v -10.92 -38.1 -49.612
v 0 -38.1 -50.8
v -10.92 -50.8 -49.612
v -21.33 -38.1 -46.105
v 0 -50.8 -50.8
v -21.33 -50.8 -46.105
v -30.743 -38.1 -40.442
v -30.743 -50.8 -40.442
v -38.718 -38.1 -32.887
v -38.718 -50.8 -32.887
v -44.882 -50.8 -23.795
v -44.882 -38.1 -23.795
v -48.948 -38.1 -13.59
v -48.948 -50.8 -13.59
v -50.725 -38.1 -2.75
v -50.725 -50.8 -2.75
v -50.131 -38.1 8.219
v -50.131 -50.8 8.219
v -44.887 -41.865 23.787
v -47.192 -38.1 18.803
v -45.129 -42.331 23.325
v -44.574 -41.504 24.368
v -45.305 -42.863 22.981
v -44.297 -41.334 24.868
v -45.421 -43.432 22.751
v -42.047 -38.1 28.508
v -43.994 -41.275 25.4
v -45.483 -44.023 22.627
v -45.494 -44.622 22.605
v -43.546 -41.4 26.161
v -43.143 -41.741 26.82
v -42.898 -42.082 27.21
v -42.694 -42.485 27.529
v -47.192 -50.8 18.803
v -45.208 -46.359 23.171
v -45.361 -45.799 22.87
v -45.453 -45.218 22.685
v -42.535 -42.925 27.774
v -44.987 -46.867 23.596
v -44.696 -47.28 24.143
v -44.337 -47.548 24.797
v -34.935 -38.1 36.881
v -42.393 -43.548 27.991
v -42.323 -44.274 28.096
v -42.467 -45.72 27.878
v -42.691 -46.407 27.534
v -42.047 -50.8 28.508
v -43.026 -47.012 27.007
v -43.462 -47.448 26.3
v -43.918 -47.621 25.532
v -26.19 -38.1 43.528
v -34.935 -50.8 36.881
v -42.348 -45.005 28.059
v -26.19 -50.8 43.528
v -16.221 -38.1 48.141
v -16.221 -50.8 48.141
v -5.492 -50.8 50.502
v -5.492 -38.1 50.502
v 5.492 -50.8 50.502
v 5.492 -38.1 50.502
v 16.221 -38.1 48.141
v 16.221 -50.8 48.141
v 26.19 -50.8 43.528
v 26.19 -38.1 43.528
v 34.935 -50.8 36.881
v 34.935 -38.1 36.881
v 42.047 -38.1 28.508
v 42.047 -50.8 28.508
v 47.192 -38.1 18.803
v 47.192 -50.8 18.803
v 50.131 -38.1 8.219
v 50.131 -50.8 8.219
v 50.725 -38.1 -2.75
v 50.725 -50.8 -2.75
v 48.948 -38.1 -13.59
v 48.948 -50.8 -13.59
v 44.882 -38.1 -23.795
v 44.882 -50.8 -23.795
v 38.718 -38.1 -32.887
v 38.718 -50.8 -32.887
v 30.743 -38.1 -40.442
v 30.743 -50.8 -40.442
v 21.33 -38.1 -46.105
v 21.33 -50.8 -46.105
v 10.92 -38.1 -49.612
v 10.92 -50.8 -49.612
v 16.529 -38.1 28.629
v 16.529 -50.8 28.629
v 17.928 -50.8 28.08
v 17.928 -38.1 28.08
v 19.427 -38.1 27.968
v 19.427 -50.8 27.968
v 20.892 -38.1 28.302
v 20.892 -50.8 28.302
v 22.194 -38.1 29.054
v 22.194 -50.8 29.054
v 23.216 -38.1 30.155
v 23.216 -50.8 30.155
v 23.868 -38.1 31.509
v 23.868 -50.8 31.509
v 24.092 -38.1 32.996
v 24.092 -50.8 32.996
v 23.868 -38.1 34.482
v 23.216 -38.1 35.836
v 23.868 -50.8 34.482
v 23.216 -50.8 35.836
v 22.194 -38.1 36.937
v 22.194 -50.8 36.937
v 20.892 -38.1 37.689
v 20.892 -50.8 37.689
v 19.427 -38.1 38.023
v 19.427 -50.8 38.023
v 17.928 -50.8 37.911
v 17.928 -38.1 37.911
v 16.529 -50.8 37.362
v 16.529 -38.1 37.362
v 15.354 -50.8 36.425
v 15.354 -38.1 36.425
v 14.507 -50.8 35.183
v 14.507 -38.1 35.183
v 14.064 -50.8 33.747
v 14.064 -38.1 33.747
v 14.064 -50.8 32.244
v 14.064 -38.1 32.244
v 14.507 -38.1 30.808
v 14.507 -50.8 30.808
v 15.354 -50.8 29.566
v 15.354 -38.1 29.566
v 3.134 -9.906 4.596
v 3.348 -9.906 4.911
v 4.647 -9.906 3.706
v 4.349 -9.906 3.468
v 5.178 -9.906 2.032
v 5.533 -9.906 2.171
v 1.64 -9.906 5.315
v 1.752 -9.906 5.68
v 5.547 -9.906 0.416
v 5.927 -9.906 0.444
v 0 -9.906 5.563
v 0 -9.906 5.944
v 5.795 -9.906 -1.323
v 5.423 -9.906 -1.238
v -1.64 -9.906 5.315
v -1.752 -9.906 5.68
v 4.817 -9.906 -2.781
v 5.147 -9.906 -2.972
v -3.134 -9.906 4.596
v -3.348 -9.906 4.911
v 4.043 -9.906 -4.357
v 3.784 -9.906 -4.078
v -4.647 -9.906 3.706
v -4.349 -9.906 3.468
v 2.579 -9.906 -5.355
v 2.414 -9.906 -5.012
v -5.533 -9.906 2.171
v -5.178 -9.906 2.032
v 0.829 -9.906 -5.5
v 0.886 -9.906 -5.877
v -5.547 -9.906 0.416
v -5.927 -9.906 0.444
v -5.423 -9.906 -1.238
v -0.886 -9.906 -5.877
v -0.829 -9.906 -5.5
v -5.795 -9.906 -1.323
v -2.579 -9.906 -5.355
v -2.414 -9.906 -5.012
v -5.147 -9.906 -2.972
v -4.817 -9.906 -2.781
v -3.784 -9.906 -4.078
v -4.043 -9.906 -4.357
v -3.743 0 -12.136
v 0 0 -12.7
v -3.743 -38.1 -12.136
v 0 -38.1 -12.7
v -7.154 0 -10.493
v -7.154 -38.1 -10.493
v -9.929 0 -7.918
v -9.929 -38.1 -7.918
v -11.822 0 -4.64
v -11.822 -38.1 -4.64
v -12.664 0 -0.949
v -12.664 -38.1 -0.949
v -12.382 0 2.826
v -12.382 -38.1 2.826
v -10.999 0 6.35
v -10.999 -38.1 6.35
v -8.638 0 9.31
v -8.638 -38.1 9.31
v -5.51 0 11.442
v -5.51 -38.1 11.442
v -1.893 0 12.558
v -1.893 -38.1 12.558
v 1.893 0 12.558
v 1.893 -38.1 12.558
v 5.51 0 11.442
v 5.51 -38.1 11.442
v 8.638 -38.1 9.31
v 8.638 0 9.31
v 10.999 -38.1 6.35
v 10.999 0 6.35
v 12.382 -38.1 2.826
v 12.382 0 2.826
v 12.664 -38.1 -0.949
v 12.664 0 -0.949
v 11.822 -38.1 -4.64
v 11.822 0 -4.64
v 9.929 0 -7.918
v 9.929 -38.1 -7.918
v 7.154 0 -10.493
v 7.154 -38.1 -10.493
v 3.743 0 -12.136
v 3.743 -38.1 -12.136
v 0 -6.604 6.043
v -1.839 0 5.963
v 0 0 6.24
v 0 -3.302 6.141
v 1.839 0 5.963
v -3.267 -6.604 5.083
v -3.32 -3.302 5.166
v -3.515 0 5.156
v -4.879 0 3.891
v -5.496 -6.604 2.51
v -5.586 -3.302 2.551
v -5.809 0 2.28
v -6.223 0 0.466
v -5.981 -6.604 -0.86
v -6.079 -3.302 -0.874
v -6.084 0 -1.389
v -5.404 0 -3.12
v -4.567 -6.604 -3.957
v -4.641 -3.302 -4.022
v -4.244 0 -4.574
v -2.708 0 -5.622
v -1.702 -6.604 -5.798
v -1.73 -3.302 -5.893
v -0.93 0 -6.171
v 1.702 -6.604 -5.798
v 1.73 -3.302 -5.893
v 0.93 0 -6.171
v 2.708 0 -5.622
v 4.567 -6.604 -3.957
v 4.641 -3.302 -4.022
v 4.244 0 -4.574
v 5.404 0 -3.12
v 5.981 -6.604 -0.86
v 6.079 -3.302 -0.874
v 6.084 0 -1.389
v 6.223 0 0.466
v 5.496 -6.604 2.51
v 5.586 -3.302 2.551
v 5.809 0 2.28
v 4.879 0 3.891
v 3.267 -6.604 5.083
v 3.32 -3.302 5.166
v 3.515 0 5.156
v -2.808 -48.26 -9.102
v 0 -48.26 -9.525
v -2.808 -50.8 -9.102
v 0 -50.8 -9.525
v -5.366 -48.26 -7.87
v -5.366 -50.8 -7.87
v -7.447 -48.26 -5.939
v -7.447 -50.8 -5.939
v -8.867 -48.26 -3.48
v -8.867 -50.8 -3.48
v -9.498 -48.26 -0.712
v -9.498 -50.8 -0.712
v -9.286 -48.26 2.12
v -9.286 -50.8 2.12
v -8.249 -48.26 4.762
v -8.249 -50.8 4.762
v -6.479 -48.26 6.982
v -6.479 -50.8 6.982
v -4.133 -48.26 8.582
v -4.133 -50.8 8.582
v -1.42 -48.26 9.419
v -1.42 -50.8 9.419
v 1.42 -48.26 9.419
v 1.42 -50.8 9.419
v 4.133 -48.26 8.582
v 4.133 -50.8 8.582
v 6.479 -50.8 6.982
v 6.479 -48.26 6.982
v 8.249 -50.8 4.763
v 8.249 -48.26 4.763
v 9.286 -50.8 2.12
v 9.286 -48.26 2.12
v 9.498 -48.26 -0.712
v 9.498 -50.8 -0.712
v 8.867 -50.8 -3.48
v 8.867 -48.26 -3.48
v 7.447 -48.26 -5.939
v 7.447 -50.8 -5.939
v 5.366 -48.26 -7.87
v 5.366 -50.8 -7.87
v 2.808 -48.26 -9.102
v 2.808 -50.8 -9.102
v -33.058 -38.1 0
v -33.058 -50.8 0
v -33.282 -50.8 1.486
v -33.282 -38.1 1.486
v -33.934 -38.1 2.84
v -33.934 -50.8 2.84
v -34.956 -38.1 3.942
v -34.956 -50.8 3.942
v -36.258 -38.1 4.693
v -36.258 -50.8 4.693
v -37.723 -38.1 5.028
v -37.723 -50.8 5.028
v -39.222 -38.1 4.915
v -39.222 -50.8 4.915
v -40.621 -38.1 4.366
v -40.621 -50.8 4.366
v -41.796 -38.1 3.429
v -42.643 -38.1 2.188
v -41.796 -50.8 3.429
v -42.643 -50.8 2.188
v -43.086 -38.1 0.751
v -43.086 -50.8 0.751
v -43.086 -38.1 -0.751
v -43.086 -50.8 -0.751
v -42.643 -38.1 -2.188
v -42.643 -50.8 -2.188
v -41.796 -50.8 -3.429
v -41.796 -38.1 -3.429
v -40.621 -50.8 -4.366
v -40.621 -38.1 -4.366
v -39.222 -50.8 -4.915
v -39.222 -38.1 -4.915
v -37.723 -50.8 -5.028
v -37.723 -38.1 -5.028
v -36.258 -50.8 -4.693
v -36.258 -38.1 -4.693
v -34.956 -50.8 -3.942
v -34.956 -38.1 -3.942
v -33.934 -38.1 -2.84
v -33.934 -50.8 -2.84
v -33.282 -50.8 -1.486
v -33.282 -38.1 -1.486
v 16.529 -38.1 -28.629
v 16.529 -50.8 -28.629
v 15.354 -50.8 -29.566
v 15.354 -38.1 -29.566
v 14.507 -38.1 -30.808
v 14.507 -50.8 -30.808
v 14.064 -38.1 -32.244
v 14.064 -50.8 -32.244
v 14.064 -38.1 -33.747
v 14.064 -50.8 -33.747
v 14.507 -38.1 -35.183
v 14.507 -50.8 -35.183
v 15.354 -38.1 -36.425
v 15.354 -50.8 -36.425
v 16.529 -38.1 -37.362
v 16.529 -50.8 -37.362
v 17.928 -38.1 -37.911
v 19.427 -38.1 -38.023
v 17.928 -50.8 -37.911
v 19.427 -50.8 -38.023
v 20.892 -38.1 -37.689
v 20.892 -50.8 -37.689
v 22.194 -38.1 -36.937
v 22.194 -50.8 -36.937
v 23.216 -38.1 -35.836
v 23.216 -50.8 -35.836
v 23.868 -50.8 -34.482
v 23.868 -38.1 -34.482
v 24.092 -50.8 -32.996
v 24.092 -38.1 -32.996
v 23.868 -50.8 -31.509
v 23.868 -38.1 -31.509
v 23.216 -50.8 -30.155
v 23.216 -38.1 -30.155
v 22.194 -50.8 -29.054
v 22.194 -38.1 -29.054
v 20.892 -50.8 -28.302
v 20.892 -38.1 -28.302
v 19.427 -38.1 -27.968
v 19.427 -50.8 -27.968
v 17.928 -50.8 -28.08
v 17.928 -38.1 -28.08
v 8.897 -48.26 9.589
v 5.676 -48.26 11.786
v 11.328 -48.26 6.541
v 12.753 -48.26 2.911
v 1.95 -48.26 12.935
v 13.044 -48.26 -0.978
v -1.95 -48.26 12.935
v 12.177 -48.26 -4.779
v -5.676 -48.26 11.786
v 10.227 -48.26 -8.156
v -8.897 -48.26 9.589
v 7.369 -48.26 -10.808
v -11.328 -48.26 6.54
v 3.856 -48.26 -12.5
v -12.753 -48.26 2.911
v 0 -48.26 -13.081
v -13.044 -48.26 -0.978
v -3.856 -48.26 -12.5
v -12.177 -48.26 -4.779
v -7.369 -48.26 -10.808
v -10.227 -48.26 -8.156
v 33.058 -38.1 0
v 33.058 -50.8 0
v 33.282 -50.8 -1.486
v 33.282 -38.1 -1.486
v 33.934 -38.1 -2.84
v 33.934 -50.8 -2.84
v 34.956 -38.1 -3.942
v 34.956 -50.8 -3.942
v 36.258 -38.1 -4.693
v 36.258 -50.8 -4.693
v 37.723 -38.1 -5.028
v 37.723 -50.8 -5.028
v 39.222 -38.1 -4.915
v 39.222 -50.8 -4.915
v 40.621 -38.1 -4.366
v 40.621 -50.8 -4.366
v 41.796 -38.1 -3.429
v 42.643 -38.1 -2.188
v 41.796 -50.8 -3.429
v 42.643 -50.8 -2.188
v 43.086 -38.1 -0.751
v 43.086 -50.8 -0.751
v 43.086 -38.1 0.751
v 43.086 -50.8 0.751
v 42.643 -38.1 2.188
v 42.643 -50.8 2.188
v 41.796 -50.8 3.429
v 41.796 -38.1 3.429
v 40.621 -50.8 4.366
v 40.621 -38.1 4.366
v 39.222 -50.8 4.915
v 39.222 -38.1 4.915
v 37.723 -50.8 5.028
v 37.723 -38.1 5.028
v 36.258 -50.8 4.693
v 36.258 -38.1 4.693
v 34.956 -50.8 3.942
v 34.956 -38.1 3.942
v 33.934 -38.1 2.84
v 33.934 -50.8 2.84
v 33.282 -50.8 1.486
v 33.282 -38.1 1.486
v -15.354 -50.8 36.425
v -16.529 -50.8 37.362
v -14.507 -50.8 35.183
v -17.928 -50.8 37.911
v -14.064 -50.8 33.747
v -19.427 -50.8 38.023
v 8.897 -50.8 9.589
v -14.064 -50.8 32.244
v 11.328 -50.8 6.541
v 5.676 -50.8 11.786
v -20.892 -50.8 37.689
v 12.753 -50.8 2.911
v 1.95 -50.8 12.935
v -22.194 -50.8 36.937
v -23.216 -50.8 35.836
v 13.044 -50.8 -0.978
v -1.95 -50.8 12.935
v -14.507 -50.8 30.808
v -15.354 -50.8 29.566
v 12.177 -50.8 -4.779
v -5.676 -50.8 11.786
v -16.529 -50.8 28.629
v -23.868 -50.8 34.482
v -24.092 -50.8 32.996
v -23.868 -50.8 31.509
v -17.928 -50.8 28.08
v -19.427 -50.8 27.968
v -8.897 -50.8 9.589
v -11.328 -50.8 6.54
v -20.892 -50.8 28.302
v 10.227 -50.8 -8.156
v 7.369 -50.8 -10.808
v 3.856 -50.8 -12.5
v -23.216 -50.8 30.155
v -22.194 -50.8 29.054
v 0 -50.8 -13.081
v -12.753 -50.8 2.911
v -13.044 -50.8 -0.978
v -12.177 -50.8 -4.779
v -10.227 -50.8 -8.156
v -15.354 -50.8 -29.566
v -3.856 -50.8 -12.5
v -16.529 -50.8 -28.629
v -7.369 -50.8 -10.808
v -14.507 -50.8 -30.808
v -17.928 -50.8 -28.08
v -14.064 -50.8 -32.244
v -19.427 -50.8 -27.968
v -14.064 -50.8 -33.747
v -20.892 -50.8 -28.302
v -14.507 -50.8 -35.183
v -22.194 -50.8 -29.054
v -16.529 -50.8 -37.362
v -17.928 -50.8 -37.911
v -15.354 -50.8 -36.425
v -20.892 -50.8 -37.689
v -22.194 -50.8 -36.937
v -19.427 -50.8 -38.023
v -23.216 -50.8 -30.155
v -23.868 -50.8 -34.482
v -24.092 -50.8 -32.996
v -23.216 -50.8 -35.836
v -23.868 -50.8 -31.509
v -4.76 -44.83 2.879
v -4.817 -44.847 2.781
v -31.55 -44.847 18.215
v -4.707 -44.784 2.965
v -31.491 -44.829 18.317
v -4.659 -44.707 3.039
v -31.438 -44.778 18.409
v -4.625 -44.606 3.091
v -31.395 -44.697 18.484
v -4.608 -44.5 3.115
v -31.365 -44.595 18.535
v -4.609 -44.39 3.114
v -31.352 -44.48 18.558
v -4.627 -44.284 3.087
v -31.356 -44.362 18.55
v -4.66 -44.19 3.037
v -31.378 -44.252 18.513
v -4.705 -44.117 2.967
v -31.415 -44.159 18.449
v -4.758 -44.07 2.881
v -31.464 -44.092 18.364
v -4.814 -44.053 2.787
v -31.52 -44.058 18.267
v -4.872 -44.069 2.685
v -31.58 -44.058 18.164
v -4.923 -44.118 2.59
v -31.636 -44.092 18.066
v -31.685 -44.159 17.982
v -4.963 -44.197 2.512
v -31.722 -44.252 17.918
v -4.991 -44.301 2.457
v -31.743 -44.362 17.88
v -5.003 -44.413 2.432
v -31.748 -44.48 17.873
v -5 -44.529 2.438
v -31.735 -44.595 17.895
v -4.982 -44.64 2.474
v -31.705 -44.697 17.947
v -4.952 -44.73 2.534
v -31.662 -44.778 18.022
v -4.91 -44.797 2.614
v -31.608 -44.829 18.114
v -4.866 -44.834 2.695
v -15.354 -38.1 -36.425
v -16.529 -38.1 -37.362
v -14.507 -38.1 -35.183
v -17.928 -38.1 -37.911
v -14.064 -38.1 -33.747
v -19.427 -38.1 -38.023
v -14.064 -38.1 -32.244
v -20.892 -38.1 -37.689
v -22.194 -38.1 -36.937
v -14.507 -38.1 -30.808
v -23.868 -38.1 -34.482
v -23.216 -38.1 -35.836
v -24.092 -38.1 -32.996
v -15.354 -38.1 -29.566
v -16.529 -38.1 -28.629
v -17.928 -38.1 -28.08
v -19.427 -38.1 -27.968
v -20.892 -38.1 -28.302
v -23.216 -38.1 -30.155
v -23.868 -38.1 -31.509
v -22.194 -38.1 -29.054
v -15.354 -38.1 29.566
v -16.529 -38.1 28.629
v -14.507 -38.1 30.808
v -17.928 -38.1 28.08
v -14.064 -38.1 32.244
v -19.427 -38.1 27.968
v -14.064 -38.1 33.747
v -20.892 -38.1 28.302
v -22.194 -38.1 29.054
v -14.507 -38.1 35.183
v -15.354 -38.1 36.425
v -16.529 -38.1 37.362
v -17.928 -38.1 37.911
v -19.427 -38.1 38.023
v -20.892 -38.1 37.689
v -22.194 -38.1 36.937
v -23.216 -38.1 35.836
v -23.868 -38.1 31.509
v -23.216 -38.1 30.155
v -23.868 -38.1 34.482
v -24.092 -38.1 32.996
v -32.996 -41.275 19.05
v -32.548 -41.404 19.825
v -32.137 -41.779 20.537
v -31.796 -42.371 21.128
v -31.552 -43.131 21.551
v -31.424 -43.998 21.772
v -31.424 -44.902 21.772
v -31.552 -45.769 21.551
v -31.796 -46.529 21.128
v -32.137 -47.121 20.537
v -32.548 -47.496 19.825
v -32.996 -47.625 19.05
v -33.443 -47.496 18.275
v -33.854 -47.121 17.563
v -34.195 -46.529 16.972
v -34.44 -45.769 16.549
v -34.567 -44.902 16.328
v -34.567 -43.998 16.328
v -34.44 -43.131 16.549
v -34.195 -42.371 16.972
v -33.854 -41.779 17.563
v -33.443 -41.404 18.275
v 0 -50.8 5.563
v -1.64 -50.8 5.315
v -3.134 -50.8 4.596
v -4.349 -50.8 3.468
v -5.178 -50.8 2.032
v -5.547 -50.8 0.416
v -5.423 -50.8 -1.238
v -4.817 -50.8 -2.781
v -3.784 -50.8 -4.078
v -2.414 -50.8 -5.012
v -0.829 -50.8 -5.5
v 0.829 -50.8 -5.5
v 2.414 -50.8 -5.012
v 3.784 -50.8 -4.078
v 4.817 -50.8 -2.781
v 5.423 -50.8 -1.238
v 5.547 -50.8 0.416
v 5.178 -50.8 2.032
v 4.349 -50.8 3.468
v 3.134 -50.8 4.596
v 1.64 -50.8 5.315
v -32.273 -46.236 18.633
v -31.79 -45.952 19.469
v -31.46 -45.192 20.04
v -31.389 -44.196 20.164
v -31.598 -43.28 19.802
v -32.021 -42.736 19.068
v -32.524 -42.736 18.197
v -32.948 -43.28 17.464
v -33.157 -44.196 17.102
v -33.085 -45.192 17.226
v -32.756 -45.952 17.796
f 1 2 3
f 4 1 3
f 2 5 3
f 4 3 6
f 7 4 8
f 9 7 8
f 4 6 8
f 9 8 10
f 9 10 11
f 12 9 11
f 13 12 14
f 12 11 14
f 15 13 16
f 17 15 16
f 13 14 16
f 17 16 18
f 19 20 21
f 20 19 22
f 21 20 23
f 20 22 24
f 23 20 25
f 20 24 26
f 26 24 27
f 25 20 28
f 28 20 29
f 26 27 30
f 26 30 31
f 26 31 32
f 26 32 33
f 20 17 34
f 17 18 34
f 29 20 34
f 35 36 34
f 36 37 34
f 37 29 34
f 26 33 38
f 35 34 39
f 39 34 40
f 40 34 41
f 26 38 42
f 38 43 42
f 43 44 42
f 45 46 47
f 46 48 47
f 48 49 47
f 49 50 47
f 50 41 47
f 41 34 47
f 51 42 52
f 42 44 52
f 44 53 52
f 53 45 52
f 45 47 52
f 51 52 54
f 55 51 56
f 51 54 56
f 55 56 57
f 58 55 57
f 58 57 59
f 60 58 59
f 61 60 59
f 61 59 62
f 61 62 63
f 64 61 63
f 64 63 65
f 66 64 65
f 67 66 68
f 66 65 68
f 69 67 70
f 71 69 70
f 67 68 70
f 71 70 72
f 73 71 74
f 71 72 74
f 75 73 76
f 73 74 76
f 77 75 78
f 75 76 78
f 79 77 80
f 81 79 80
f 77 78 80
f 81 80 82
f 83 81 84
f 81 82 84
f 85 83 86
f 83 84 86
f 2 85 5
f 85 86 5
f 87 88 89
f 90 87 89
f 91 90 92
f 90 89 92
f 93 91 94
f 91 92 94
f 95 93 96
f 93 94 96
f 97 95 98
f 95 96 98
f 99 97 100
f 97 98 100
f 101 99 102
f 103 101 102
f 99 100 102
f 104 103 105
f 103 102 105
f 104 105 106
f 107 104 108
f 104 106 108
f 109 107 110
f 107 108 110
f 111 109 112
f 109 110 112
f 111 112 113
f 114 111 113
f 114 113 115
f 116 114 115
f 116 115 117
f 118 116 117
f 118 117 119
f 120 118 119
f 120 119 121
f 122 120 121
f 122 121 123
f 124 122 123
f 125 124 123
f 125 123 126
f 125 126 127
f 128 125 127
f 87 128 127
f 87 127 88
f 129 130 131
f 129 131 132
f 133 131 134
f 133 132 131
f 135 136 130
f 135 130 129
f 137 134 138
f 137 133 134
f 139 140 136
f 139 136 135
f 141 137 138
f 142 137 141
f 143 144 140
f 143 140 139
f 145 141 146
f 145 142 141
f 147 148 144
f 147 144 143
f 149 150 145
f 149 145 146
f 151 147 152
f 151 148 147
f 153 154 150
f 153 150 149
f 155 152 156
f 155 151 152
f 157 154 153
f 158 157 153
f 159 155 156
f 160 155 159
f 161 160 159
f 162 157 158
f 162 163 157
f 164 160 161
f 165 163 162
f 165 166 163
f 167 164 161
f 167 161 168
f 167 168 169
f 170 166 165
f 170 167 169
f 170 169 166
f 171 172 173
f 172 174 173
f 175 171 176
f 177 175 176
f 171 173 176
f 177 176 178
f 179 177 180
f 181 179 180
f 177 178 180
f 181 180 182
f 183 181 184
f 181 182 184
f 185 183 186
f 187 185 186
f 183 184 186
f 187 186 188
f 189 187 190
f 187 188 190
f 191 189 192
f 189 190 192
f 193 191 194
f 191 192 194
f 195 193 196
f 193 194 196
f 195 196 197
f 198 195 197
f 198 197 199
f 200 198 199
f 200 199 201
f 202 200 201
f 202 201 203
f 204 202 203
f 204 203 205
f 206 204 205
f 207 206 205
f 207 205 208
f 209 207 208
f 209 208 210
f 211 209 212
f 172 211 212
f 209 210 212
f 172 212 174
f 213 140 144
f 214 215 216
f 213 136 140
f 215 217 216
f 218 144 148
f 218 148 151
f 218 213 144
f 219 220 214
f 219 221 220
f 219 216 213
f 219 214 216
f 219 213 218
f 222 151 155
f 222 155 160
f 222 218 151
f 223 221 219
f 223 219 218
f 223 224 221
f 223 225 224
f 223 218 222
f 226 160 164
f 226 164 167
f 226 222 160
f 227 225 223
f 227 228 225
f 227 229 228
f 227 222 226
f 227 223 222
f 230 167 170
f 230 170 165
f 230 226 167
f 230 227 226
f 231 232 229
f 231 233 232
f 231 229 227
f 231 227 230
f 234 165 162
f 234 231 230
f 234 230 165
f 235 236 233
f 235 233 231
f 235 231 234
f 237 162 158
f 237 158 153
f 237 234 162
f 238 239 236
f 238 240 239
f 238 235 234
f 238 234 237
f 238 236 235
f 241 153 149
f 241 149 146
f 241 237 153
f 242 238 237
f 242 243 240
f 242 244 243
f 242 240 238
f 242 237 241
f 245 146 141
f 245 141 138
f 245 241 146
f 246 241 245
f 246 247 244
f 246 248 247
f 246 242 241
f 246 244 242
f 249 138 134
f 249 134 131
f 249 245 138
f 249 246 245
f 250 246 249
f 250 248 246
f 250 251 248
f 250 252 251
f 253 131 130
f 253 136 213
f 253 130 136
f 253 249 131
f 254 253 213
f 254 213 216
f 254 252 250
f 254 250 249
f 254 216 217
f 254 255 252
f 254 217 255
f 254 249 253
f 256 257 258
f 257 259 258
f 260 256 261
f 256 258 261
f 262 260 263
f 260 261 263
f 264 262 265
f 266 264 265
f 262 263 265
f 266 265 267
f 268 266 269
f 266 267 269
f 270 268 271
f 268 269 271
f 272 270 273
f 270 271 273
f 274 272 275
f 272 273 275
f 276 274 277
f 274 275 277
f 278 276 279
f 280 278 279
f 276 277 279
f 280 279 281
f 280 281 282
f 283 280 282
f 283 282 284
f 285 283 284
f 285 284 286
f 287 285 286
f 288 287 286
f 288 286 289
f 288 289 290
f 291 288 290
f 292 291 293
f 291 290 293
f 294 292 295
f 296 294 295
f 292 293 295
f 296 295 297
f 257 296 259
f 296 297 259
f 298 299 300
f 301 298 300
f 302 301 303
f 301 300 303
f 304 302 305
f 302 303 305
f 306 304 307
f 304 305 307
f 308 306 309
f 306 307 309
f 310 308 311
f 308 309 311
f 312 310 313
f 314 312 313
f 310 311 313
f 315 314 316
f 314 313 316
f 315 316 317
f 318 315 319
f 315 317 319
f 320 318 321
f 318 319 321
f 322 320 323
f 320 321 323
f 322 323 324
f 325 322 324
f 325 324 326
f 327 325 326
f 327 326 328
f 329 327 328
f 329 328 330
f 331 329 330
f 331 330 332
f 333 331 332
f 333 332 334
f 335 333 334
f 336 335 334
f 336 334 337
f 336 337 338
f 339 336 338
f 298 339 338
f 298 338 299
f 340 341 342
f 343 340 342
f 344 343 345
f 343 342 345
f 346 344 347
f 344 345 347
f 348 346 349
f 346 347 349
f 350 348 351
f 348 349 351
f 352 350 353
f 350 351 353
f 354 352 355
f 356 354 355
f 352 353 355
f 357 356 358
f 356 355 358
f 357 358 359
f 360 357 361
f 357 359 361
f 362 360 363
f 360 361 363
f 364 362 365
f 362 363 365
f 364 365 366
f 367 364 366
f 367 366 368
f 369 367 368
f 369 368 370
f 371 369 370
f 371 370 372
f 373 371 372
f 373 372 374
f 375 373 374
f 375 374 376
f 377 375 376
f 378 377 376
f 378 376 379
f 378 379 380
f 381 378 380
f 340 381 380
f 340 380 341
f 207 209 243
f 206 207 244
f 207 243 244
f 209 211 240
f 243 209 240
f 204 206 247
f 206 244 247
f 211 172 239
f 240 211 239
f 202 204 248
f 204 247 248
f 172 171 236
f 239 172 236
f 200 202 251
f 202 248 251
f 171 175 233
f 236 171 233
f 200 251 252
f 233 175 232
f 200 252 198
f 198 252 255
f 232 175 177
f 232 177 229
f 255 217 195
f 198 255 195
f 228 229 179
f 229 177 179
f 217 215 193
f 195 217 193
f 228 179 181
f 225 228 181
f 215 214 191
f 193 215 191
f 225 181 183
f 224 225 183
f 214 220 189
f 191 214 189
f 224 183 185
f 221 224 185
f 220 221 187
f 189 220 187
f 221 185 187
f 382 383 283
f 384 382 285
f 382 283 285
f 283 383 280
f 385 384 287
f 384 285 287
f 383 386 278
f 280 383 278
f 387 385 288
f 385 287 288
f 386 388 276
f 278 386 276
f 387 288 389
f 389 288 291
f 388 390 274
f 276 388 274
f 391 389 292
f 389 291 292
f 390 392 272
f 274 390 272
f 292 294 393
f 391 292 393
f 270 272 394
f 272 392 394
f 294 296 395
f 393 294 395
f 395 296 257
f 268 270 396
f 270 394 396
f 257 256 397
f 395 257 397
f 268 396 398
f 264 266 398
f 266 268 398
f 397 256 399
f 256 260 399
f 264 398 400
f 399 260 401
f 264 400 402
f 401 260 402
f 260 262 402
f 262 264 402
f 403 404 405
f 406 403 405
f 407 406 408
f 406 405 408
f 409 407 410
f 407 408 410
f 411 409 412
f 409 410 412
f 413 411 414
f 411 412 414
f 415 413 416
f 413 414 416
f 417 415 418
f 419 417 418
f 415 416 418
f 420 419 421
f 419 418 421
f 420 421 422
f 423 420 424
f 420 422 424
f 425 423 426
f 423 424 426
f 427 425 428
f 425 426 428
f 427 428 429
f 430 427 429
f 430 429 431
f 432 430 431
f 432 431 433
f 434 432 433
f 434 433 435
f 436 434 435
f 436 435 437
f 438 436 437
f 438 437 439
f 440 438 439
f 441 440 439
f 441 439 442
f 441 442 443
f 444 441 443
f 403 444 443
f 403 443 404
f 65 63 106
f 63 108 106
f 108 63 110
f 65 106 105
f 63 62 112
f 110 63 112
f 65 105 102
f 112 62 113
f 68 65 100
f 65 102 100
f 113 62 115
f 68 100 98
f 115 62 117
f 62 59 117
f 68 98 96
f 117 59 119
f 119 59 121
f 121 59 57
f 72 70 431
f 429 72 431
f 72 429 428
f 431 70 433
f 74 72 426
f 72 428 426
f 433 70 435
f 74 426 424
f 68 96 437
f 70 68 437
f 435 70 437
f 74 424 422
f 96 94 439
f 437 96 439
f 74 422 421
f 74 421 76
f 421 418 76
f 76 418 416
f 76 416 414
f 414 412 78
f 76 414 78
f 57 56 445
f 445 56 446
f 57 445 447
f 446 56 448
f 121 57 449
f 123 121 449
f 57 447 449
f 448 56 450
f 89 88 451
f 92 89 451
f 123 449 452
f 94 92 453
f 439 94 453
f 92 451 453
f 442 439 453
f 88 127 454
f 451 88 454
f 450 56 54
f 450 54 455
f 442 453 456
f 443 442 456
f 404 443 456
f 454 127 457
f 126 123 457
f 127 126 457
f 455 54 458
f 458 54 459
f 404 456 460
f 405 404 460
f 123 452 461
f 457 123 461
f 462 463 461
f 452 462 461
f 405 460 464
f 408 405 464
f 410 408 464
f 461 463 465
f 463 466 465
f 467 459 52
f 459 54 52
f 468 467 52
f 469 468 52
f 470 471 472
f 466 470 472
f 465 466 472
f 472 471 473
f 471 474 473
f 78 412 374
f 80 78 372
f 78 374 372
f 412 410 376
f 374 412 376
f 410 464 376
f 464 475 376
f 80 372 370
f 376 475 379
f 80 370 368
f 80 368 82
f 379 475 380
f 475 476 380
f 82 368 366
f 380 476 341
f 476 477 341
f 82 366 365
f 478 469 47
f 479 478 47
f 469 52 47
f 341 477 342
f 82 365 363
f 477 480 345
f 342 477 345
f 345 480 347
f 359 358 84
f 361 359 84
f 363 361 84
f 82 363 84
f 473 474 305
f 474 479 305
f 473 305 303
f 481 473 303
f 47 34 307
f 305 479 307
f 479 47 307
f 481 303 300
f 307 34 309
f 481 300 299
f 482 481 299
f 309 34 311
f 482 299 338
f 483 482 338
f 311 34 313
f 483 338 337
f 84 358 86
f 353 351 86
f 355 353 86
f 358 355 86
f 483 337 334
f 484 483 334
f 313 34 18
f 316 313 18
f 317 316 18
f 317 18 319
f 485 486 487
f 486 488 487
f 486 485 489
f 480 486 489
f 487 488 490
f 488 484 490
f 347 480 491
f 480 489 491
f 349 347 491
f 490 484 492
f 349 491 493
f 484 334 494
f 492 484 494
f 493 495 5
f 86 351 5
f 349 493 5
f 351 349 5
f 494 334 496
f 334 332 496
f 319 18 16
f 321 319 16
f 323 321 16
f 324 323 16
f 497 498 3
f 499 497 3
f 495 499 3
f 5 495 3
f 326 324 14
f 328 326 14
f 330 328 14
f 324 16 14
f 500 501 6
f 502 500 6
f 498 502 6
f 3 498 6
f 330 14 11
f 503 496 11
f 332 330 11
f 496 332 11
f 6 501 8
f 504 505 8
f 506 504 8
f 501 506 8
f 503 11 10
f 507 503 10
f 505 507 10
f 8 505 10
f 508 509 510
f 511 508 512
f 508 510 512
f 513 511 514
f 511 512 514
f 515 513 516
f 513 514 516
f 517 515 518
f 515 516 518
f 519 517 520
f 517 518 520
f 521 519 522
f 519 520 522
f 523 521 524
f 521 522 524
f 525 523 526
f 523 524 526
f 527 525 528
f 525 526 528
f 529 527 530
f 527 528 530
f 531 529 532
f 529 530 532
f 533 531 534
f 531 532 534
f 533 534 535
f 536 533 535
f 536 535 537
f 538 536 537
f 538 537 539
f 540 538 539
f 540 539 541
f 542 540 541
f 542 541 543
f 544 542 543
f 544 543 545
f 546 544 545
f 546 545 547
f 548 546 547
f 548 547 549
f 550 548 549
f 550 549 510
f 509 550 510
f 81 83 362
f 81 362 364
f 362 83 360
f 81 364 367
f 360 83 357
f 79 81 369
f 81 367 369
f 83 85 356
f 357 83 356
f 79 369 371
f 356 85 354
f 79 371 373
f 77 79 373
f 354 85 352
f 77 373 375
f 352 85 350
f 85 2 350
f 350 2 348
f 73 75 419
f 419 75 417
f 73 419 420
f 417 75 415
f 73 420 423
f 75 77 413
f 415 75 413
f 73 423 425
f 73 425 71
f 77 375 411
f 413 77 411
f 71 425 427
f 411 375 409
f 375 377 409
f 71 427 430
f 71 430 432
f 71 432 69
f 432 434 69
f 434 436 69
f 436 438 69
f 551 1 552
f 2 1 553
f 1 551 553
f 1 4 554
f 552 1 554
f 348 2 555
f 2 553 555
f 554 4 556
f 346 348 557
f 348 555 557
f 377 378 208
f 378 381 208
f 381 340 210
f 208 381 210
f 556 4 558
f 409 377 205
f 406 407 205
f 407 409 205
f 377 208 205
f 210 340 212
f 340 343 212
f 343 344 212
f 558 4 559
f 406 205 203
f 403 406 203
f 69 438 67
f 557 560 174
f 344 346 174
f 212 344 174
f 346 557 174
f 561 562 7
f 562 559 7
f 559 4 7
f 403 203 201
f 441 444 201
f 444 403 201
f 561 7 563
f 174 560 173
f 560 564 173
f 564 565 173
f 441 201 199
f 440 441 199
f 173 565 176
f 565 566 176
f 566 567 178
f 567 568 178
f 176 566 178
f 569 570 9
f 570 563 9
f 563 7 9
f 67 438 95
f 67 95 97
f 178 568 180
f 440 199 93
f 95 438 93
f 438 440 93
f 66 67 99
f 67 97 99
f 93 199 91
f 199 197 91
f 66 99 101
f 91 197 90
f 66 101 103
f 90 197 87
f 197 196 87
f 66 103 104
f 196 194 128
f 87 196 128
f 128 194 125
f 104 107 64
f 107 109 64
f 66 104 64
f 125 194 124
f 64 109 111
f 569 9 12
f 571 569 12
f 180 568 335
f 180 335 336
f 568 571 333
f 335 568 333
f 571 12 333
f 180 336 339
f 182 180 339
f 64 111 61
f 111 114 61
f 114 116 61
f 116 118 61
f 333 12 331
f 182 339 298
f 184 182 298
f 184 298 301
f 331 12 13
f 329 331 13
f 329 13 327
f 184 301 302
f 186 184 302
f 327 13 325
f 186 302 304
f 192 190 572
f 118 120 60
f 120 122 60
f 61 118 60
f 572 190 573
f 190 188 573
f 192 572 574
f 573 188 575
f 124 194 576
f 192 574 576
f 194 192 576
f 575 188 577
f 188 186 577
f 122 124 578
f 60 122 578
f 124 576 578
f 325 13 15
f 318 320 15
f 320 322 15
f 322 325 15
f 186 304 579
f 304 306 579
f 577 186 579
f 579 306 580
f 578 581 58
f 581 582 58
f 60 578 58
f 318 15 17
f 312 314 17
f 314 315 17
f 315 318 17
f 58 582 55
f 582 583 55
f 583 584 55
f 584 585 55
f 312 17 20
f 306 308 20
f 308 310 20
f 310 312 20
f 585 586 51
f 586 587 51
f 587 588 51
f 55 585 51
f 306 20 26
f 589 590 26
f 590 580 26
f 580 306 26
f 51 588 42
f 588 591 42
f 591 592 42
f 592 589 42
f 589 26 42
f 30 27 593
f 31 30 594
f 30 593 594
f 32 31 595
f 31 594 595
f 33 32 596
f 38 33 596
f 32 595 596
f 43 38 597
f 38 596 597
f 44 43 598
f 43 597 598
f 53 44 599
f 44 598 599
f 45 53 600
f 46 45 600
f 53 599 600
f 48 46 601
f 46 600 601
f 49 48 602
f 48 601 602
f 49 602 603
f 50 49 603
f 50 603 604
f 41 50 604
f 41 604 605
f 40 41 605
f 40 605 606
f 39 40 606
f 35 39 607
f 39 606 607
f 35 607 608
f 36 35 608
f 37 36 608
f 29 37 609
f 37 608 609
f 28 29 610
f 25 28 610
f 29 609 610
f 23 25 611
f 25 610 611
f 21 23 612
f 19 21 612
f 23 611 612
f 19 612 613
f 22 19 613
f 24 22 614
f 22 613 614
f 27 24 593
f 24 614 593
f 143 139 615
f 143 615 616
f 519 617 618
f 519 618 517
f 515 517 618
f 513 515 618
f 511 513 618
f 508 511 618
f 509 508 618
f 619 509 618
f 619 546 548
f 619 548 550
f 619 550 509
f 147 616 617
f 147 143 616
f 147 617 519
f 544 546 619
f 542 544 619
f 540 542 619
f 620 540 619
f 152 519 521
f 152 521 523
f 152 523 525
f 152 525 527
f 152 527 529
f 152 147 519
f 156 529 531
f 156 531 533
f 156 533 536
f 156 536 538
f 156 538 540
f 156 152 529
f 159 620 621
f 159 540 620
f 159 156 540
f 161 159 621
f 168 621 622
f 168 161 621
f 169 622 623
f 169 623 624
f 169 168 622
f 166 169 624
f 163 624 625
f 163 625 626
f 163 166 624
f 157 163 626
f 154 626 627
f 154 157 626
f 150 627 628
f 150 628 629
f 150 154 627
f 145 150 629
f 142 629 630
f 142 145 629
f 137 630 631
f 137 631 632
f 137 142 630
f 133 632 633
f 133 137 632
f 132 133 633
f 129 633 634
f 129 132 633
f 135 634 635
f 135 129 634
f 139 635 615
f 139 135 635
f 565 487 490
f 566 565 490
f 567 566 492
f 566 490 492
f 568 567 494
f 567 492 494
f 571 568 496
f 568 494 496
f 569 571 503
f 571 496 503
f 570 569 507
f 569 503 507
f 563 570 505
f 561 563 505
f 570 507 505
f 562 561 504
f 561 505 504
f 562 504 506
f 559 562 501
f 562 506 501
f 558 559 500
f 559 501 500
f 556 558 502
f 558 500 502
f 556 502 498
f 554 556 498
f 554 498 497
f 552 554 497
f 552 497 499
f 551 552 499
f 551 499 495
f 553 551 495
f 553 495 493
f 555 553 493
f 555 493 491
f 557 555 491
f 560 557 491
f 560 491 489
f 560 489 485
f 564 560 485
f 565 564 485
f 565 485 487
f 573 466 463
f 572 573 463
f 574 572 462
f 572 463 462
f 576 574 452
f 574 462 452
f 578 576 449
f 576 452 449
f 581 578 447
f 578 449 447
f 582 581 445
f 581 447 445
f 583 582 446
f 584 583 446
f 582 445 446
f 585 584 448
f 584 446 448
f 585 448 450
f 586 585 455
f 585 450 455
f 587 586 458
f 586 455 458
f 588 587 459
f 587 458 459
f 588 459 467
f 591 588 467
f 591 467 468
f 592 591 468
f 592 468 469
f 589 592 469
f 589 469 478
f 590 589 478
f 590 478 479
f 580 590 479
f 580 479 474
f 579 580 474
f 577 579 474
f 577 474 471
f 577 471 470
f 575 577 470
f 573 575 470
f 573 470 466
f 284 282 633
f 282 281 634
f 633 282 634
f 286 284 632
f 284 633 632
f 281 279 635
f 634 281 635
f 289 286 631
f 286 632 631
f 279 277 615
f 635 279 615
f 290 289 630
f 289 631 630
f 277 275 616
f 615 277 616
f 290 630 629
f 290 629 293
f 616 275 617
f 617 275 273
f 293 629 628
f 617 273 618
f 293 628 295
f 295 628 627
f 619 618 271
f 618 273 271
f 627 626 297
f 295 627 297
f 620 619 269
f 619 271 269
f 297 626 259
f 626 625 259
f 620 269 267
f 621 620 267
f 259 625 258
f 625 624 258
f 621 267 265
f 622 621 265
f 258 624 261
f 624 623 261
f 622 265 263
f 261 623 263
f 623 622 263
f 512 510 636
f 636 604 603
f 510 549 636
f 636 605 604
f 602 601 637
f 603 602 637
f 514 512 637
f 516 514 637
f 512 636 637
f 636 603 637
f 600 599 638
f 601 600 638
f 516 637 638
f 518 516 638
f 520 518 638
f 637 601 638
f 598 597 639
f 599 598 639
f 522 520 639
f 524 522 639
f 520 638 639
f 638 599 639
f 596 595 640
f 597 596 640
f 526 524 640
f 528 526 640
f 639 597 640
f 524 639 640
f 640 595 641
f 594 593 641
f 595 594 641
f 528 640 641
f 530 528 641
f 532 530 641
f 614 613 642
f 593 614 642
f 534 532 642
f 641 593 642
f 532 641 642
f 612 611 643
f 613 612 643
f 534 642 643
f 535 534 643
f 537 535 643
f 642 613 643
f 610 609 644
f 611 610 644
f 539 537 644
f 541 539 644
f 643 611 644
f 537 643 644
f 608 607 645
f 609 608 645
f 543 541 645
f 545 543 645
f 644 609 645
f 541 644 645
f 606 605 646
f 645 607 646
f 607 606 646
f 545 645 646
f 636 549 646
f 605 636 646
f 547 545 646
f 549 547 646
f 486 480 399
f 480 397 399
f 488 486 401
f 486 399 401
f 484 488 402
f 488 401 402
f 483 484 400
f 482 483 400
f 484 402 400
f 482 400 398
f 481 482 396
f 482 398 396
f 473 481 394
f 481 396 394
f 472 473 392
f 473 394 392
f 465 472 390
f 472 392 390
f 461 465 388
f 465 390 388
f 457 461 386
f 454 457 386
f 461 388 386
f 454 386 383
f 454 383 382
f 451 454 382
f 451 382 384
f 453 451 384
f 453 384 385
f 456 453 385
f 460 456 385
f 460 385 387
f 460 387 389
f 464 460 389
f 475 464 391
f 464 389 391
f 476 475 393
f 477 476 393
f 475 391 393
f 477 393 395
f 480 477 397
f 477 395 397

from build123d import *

# Parameters (mm, degrees)
F_3_8_CLEARANCE_HOLE1_D              = 10.0838
CIRPATTERN1_COUNT                    = 6
F_1_32_0_03125_DIAMETER_HOLE1_REACH  = 133.807
F_1_32_0_03125_DIAMETER_HOLE1_BORE_R = 0.396875
F_1_4_0_25_DIAMETER_HOLE1_D          = 6.35
F_1_4_0_25_DIAMETER_HOLE1_DEPTH      = 12.7
F_1_4_0_25_DIAMETER_HOLE1_TIP        = 1.907732465


with BuildPart() as part:
    # Sketch1 → Revolve1 (revolve)
    with BuildSketch(Plane.XY, mode=Mode.PRIVATE) as revolve1_sk:
        Polygon((0, 0), (-12.7, 0), (-12.7, -38.1), (-50.8, -38.1), (-50.8, -50.8), (-13.081, -50.8), (-13.081, -48.26), (-9.525, -48.26), (-9.525, -50.8), (0, -50.8), align=None)
    revolve(revolve1_sk.sketch.rotate(Axis((0, -50.8, 0), (0, 1, 0)), 270), axis=Axis((0, -50.8, 0), (0, 1, 0)))

    # Sketch4 → 1/4 NPT Tapped Hole1 (revolve, cut)
    with BuildSketch(Plane(origin=(0, 0, 0), x_dir=(0, 0, 1), z_dir=(1, 0, 0))):
        Polygon((0, 0), (0, 50.8), (5.5626, 50.8), (5.5626, 9.906), (5.943685794, 9.906), (6.2402847, 0), align=None)
    revolve(axis=Axis((0, 6.35, 0), (0, -1, 0)), mode=Mode.SUBTRACT)

    # 3/8 Clearance Hole1 (through all)
    with Locations(Plane(origin=(0, -38.1, 0), x_dir=(1, 0, 0), z_dir=(0, 1, 0))):
        with Locations((38.1, 0)):
            f_3_8_clearance_hole1 = Hole(F_3_8_CLEARANCE_HOLE1_D / 2)

    # CirPattern1: 3/8 Clearance Hole1 ×6 about axis
    cirpattern1_axis = Axis((0, 0, 0), (0, 1, 0))
    for i in range(1, CIRPATTERN1_COUNT):
        add(f_3_8_clearance_hole1.rotate(cirpattern1_axis, i * 360 / CIRPATTERN1_COUNT), mode=Mode.SUBTRACT)

    # 1/32 (0.03125) Diameter Hole1 bore → 1/32 (0.03125) Diameter Hole1 (cut, up to next)
    with BuildSketch(Plane(origin=(-43.994090512, 0, 25.4), x_dir=(0, -1, 0), z_dir=(-0.8660254037844398, 0, 0.499999999999998)), mode=Mode.PRIVATE) as f_1_32_0_03125_diameter_hole1_sk1:
        with Locations((44.45, 0)):
            Circle(F_1_32_0_03125_DIAMETER_HOLE1_BORE_R)
    f_1_32_0_03125_diameter_hole1_tool1 = extrude(f_1_32_0_03125_diameter_hole1_sk1.sketch, amount=-F_1_32_0_03125_DIAMETER_HOLE1_REACH, mode=Mode.PRIVATE) & part.part
    add(f_1_32_0_03125_diameter_hole1_tool1.solids().sort_by_distance((-43.994091, -44.45, 25.4))[0], mode=Mode.SUBTRACT)

    # 1/4 (0.25) Diameter Hole1
    with Locations(Plane(origin=(-43.994090512, 0, 25.4), x_dir=(0, -1, 0), z_dir=(-0.8660254037844398, 0, 0.499999999999998))):
        with Locations((44.45, 0)):
            Hole(F_1_4_0_25_DIAMETER_HOLE1_D / 2, depth=F_1_4_0_25_DIAMETER_HOLE1_DEPTH)
            with Locations((0, 0, -(F_1_4_0_25_DIAMETER_HOLE1_DEPTH + F_1_4_0_25_DIAMETER_HOLE1_TIP / 2))):  # 118° drill point
                Cone(0, F_1_4_0_25_DIAMETER_HOLE1_D / 2, F_1_4_0_25_DIAMETER_HOLE1_TIP, mode=Mode.SUBTRACT)


solid = part.part
